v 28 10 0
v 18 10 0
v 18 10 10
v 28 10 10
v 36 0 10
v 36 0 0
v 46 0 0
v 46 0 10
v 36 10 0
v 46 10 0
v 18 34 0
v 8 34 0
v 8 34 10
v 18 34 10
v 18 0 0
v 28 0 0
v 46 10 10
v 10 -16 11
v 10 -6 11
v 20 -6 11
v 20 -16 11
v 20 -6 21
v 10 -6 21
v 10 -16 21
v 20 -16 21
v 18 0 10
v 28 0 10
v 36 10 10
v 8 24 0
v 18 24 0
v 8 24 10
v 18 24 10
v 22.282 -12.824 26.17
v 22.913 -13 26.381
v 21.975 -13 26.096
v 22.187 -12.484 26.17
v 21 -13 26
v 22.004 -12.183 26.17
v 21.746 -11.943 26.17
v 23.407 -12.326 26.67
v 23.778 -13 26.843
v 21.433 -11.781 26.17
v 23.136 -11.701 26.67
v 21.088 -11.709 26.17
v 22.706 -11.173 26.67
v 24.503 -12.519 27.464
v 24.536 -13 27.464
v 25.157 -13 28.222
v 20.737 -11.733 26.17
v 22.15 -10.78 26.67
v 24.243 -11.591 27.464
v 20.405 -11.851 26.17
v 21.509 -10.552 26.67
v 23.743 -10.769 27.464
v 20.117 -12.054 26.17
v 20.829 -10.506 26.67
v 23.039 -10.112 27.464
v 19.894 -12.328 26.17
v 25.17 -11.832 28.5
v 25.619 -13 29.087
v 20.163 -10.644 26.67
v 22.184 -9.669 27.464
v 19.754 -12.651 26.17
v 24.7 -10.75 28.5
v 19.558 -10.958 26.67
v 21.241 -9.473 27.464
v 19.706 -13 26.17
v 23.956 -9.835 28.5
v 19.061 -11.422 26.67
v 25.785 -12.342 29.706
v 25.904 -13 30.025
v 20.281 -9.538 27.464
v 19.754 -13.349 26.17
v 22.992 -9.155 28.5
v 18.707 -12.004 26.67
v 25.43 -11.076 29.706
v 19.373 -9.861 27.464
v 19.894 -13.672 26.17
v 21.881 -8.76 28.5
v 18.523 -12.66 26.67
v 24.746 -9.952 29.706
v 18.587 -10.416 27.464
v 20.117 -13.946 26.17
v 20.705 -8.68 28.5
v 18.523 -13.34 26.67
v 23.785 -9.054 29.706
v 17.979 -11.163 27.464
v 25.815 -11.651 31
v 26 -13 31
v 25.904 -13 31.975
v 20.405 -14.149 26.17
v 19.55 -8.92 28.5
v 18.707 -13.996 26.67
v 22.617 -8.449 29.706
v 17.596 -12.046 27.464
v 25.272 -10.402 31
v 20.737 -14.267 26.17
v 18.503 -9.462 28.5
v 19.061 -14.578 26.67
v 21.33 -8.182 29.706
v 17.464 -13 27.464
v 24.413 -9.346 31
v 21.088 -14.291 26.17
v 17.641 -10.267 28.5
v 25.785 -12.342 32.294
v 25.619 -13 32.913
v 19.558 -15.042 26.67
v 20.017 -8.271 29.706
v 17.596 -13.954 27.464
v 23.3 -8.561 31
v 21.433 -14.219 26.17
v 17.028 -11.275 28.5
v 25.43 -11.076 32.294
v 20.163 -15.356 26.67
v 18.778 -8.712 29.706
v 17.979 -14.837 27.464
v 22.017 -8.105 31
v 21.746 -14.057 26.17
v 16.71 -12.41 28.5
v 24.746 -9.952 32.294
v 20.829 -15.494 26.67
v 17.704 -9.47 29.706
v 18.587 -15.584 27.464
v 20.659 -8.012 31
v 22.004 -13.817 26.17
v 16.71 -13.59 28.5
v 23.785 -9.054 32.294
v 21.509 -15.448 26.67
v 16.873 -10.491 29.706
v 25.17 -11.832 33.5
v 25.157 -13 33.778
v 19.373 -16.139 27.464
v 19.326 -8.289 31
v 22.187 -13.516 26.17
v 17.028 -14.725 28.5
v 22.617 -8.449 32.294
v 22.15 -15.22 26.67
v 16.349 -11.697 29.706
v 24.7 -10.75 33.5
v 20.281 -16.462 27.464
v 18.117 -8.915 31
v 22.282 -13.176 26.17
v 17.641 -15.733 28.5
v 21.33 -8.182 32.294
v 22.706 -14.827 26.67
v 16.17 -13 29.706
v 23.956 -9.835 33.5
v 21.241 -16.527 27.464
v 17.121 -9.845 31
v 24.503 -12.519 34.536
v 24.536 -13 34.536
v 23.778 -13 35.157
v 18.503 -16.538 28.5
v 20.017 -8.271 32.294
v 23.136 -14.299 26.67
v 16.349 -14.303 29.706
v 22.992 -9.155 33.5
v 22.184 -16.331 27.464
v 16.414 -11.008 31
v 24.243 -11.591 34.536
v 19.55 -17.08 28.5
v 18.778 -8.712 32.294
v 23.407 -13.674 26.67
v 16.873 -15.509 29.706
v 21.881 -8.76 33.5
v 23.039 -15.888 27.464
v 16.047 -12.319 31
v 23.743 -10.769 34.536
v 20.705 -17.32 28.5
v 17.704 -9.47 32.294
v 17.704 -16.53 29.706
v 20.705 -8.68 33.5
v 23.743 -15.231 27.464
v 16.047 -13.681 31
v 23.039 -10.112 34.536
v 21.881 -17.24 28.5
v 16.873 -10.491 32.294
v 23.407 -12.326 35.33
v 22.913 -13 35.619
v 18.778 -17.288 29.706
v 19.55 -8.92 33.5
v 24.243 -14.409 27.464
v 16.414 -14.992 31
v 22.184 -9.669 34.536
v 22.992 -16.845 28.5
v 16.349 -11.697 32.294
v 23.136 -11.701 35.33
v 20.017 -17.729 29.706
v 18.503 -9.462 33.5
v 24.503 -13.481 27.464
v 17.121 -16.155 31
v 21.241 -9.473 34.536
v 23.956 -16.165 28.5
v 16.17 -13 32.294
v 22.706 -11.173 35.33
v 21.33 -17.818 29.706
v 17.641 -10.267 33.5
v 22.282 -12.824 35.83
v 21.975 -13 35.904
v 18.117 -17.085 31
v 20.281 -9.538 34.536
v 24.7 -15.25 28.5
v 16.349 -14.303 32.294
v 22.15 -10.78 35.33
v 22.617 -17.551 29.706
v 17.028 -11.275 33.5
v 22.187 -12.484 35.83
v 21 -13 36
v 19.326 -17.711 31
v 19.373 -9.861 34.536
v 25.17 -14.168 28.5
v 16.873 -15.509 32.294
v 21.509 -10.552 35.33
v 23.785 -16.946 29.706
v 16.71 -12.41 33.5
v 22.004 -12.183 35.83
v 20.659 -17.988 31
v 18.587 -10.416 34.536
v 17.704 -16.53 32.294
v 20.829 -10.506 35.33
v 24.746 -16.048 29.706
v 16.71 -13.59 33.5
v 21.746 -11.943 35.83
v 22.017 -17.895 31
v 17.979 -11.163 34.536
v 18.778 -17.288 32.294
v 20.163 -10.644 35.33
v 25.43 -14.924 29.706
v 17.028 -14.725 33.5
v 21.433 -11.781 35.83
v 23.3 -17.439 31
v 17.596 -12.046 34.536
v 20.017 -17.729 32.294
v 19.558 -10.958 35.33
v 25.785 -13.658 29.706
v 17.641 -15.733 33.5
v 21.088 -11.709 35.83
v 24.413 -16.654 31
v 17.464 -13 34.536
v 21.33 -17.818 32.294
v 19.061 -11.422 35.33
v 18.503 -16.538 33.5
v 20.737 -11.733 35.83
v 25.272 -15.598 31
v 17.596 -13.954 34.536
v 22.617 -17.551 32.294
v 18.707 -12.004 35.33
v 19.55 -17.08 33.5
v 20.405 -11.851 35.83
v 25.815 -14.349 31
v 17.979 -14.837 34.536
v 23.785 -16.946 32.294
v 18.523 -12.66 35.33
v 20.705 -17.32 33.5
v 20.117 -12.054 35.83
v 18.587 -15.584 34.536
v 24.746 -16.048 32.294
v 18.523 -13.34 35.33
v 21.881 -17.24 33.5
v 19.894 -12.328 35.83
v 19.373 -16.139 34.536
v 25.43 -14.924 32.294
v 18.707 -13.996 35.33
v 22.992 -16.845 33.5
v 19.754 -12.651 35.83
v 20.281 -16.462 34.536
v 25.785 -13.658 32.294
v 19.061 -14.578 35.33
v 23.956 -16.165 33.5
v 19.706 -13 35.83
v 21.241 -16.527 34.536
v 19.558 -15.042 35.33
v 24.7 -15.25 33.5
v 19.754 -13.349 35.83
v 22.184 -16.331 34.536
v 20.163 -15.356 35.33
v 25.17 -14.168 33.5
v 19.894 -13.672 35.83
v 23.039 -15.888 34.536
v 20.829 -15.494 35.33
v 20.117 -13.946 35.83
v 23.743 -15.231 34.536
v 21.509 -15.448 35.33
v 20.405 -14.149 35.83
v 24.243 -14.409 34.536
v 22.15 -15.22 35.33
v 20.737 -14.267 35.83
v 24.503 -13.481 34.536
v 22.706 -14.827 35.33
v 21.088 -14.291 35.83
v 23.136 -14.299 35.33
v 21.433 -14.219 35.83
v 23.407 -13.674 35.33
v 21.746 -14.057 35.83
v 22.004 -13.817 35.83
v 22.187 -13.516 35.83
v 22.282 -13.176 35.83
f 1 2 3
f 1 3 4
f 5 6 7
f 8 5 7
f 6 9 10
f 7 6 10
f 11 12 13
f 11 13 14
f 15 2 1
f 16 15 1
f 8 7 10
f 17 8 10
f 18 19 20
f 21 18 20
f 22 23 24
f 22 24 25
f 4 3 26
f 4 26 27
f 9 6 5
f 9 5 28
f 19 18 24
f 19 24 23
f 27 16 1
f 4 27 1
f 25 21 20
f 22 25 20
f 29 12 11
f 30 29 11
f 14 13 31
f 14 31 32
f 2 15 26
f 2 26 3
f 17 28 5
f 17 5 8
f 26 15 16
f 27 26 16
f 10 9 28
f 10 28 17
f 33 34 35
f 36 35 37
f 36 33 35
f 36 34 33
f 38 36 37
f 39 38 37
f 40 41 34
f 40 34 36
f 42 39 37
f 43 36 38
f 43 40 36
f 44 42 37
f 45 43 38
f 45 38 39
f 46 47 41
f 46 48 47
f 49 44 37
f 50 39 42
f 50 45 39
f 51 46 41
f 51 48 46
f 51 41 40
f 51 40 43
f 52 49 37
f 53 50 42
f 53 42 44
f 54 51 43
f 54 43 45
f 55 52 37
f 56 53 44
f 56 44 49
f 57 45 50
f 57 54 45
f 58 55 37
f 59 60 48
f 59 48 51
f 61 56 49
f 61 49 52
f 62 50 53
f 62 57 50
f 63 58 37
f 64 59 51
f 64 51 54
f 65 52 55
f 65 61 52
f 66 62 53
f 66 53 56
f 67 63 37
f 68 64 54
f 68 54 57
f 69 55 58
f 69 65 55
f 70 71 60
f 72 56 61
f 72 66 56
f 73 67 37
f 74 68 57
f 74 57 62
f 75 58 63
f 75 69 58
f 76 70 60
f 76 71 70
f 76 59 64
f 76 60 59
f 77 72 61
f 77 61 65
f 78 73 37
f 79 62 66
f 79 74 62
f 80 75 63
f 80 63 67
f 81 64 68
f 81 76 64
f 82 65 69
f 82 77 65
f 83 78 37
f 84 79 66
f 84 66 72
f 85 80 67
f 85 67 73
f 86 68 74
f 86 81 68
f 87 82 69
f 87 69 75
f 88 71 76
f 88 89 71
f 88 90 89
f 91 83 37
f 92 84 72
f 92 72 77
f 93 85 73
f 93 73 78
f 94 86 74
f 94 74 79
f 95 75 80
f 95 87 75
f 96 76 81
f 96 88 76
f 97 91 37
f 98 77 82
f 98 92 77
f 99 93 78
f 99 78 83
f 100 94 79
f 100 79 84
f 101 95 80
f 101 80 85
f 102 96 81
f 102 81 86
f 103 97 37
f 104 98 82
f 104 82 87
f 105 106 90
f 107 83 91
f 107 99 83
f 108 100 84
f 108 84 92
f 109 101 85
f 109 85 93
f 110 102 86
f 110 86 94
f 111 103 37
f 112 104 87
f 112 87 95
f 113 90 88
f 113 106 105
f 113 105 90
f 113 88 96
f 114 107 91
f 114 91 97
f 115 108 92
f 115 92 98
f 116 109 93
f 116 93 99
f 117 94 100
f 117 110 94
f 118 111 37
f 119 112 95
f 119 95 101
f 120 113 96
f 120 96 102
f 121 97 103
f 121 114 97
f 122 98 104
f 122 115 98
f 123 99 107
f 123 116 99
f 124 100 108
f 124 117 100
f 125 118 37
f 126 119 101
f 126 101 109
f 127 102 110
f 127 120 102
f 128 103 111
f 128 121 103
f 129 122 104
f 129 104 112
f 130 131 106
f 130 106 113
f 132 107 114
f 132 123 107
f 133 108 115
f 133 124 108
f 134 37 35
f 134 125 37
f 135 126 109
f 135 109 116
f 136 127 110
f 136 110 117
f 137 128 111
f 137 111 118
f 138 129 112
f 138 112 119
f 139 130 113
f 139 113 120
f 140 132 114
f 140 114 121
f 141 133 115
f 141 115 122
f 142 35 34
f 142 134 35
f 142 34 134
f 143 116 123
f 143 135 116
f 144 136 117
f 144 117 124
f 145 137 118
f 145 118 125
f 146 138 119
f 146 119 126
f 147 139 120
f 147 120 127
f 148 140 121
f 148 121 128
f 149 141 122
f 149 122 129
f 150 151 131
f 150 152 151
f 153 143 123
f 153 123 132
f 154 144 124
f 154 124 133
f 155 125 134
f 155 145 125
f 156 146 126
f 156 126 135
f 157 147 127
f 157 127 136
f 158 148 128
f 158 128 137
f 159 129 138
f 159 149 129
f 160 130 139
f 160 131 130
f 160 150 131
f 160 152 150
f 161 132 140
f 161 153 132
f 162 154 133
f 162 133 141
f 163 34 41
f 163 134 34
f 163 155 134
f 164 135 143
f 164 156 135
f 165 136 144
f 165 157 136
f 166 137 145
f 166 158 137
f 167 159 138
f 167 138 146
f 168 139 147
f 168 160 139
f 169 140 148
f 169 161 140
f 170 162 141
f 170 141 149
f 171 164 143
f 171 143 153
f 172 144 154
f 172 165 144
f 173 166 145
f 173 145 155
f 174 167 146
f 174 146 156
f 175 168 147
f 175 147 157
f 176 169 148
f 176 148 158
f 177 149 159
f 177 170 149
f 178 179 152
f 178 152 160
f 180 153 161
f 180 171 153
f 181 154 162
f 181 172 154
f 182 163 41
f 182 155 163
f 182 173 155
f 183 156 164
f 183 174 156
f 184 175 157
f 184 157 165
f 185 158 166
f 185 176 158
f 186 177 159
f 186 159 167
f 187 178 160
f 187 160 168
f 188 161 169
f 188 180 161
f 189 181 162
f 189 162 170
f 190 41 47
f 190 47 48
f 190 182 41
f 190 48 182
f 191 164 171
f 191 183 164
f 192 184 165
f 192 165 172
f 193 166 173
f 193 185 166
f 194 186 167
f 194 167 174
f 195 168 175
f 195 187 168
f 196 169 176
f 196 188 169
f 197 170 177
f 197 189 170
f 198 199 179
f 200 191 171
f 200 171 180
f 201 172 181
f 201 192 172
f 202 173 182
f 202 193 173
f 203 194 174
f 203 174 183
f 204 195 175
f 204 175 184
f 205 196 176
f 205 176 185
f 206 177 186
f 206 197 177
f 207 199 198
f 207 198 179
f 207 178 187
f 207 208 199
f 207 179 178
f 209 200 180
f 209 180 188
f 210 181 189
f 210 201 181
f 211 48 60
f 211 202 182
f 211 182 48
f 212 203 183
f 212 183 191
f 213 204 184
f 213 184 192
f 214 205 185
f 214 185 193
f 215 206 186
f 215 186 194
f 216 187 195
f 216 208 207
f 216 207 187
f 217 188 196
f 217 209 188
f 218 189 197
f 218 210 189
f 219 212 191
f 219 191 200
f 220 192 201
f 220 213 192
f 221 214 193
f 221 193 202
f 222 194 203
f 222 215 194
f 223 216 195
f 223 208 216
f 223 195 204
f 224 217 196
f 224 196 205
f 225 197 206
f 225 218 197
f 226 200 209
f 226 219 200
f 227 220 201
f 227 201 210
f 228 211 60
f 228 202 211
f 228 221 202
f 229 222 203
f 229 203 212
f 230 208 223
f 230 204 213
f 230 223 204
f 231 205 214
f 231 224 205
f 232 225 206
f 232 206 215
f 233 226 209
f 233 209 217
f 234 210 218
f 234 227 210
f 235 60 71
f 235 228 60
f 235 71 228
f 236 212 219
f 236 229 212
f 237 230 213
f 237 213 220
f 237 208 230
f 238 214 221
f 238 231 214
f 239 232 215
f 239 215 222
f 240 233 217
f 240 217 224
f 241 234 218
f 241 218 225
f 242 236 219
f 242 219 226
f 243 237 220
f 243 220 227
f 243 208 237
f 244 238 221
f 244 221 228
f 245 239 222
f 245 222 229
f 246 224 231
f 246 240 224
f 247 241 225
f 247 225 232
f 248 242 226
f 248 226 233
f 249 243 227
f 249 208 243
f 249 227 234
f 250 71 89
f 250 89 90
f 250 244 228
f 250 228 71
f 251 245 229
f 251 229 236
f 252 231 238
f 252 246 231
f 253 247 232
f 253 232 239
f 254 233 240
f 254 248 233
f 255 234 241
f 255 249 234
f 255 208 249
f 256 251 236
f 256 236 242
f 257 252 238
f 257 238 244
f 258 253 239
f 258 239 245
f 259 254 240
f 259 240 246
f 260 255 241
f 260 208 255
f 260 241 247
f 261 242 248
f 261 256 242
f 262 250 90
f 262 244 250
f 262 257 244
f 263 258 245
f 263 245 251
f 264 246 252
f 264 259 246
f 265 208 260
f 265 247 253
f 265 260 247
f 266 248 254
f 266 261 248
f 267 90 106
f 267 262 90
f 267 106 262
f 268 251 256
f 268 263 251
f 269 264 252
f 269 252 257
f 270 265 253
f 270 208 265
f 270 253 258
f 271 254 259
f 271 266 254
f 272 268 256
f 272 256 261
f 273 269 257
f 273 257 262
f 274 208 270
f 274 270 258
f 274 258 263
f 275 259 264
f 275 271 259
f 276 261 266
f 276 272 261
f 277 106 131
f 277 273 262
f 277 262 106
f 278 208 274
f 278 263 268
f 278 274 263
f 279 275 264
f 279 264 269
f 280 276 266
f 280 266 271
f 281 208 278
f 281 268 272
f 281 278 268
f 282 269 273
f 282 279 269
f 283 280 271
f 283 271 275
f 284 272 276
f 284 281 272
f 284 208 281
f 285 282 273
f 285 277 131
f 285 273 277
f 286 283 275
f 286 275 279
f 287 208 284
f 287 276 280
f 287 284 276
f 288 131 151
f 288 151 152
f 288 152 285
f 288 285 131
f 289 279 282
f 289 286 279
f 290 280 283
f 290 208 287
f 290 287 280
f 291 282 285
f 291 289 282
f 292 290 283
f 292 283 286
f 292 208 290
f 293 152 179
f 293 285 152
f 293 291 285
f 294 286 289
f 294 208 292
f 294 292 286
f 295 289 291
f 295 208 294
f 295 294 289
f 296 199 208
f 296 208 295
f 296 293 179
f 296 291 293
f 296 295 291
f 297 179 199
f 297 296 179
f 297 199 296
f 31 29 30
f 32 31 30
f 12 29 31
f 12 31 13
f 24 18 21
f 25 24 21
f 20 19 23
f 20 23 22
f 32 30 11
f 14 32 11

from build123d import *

# Parameters (mm, degrees)
BOX_W        = 10
BOX_H        = 10
BOX_DEPTH    = 10
BOX001_W     = 10
BOX001_H     = 10
BOX001_DEPTH = 10
BOX002_W     = 10
BOX002_H     = 10
BOX002_DEPTH = 10
BOX003_W     = 10
BOX003_H     = 10
BOX003_DEPTH = 10


with BuildPart() as cube:
    # Box → Box (new body)
    with BuildSketch(Plane(origin=(8, 24, 0), x_dir=(1, 0, 0), z_dir=(0, 0, 1))):
        with Locations((5, 5)):
            Rectangle(BOX_W, BOX_H)
    extrude(amount=BOX_DEPTH)


with BuildPart() as cube001:
    # Box001 → Box001 (new body)
    with BuildSketch(Plane(origin=(18, 0, 0), x_dir=(1, 0, 0), z_dir=(0, 0, 1))):
        with Locations((5, 5)):
            Rectangle(BOX001_W, BOX001_H)
    extrude(amount=BOX001_DEPTH)


with BuildPart() as cube002:
    # Box002 → Box002 (new body)
    with BuildSketch(Plane(origin=(36, 0, 0), x_dir=(1, 0, 0), z_dir=(0, 0, 1))):
        with Locations((5, 5)):
            Rectangle(BOX002_W, BOX002_H)
    extrude(amount=BOX002_DEPTH)


with BuildPart() as cube003:
    # Box003 → Box003 (new body)
    with BuildSketch(Plane(origin=(10, -16, 11), x_dir=(1, 0, 0), z_dir=(0, 0, 1))):
        with Locations((5, 5)):
            Rectangle(BOX003_W, BOX003_H)
    extrude(amount=BOX003_DEPTH)


with BuildPart() as sphere:
    # Sphere → Sphere (revolve)
    with BuildSketch(Plane(origin=(21, -13, 31), x_dir=(1, 0, 0), z_dir=(0, -1, 0))):
        with BuildLine():
            ThreePointArc((0, -5), (5, 0), (0, 5))
            Line((0, 5), (0, -5))
        make_face()
    revolve(axis=Axis((21, -13, 31), (0, 0, 1)))


solid = Compound([cube.part, cube001.part, cube002.part, cube003.part, sphere.part])
